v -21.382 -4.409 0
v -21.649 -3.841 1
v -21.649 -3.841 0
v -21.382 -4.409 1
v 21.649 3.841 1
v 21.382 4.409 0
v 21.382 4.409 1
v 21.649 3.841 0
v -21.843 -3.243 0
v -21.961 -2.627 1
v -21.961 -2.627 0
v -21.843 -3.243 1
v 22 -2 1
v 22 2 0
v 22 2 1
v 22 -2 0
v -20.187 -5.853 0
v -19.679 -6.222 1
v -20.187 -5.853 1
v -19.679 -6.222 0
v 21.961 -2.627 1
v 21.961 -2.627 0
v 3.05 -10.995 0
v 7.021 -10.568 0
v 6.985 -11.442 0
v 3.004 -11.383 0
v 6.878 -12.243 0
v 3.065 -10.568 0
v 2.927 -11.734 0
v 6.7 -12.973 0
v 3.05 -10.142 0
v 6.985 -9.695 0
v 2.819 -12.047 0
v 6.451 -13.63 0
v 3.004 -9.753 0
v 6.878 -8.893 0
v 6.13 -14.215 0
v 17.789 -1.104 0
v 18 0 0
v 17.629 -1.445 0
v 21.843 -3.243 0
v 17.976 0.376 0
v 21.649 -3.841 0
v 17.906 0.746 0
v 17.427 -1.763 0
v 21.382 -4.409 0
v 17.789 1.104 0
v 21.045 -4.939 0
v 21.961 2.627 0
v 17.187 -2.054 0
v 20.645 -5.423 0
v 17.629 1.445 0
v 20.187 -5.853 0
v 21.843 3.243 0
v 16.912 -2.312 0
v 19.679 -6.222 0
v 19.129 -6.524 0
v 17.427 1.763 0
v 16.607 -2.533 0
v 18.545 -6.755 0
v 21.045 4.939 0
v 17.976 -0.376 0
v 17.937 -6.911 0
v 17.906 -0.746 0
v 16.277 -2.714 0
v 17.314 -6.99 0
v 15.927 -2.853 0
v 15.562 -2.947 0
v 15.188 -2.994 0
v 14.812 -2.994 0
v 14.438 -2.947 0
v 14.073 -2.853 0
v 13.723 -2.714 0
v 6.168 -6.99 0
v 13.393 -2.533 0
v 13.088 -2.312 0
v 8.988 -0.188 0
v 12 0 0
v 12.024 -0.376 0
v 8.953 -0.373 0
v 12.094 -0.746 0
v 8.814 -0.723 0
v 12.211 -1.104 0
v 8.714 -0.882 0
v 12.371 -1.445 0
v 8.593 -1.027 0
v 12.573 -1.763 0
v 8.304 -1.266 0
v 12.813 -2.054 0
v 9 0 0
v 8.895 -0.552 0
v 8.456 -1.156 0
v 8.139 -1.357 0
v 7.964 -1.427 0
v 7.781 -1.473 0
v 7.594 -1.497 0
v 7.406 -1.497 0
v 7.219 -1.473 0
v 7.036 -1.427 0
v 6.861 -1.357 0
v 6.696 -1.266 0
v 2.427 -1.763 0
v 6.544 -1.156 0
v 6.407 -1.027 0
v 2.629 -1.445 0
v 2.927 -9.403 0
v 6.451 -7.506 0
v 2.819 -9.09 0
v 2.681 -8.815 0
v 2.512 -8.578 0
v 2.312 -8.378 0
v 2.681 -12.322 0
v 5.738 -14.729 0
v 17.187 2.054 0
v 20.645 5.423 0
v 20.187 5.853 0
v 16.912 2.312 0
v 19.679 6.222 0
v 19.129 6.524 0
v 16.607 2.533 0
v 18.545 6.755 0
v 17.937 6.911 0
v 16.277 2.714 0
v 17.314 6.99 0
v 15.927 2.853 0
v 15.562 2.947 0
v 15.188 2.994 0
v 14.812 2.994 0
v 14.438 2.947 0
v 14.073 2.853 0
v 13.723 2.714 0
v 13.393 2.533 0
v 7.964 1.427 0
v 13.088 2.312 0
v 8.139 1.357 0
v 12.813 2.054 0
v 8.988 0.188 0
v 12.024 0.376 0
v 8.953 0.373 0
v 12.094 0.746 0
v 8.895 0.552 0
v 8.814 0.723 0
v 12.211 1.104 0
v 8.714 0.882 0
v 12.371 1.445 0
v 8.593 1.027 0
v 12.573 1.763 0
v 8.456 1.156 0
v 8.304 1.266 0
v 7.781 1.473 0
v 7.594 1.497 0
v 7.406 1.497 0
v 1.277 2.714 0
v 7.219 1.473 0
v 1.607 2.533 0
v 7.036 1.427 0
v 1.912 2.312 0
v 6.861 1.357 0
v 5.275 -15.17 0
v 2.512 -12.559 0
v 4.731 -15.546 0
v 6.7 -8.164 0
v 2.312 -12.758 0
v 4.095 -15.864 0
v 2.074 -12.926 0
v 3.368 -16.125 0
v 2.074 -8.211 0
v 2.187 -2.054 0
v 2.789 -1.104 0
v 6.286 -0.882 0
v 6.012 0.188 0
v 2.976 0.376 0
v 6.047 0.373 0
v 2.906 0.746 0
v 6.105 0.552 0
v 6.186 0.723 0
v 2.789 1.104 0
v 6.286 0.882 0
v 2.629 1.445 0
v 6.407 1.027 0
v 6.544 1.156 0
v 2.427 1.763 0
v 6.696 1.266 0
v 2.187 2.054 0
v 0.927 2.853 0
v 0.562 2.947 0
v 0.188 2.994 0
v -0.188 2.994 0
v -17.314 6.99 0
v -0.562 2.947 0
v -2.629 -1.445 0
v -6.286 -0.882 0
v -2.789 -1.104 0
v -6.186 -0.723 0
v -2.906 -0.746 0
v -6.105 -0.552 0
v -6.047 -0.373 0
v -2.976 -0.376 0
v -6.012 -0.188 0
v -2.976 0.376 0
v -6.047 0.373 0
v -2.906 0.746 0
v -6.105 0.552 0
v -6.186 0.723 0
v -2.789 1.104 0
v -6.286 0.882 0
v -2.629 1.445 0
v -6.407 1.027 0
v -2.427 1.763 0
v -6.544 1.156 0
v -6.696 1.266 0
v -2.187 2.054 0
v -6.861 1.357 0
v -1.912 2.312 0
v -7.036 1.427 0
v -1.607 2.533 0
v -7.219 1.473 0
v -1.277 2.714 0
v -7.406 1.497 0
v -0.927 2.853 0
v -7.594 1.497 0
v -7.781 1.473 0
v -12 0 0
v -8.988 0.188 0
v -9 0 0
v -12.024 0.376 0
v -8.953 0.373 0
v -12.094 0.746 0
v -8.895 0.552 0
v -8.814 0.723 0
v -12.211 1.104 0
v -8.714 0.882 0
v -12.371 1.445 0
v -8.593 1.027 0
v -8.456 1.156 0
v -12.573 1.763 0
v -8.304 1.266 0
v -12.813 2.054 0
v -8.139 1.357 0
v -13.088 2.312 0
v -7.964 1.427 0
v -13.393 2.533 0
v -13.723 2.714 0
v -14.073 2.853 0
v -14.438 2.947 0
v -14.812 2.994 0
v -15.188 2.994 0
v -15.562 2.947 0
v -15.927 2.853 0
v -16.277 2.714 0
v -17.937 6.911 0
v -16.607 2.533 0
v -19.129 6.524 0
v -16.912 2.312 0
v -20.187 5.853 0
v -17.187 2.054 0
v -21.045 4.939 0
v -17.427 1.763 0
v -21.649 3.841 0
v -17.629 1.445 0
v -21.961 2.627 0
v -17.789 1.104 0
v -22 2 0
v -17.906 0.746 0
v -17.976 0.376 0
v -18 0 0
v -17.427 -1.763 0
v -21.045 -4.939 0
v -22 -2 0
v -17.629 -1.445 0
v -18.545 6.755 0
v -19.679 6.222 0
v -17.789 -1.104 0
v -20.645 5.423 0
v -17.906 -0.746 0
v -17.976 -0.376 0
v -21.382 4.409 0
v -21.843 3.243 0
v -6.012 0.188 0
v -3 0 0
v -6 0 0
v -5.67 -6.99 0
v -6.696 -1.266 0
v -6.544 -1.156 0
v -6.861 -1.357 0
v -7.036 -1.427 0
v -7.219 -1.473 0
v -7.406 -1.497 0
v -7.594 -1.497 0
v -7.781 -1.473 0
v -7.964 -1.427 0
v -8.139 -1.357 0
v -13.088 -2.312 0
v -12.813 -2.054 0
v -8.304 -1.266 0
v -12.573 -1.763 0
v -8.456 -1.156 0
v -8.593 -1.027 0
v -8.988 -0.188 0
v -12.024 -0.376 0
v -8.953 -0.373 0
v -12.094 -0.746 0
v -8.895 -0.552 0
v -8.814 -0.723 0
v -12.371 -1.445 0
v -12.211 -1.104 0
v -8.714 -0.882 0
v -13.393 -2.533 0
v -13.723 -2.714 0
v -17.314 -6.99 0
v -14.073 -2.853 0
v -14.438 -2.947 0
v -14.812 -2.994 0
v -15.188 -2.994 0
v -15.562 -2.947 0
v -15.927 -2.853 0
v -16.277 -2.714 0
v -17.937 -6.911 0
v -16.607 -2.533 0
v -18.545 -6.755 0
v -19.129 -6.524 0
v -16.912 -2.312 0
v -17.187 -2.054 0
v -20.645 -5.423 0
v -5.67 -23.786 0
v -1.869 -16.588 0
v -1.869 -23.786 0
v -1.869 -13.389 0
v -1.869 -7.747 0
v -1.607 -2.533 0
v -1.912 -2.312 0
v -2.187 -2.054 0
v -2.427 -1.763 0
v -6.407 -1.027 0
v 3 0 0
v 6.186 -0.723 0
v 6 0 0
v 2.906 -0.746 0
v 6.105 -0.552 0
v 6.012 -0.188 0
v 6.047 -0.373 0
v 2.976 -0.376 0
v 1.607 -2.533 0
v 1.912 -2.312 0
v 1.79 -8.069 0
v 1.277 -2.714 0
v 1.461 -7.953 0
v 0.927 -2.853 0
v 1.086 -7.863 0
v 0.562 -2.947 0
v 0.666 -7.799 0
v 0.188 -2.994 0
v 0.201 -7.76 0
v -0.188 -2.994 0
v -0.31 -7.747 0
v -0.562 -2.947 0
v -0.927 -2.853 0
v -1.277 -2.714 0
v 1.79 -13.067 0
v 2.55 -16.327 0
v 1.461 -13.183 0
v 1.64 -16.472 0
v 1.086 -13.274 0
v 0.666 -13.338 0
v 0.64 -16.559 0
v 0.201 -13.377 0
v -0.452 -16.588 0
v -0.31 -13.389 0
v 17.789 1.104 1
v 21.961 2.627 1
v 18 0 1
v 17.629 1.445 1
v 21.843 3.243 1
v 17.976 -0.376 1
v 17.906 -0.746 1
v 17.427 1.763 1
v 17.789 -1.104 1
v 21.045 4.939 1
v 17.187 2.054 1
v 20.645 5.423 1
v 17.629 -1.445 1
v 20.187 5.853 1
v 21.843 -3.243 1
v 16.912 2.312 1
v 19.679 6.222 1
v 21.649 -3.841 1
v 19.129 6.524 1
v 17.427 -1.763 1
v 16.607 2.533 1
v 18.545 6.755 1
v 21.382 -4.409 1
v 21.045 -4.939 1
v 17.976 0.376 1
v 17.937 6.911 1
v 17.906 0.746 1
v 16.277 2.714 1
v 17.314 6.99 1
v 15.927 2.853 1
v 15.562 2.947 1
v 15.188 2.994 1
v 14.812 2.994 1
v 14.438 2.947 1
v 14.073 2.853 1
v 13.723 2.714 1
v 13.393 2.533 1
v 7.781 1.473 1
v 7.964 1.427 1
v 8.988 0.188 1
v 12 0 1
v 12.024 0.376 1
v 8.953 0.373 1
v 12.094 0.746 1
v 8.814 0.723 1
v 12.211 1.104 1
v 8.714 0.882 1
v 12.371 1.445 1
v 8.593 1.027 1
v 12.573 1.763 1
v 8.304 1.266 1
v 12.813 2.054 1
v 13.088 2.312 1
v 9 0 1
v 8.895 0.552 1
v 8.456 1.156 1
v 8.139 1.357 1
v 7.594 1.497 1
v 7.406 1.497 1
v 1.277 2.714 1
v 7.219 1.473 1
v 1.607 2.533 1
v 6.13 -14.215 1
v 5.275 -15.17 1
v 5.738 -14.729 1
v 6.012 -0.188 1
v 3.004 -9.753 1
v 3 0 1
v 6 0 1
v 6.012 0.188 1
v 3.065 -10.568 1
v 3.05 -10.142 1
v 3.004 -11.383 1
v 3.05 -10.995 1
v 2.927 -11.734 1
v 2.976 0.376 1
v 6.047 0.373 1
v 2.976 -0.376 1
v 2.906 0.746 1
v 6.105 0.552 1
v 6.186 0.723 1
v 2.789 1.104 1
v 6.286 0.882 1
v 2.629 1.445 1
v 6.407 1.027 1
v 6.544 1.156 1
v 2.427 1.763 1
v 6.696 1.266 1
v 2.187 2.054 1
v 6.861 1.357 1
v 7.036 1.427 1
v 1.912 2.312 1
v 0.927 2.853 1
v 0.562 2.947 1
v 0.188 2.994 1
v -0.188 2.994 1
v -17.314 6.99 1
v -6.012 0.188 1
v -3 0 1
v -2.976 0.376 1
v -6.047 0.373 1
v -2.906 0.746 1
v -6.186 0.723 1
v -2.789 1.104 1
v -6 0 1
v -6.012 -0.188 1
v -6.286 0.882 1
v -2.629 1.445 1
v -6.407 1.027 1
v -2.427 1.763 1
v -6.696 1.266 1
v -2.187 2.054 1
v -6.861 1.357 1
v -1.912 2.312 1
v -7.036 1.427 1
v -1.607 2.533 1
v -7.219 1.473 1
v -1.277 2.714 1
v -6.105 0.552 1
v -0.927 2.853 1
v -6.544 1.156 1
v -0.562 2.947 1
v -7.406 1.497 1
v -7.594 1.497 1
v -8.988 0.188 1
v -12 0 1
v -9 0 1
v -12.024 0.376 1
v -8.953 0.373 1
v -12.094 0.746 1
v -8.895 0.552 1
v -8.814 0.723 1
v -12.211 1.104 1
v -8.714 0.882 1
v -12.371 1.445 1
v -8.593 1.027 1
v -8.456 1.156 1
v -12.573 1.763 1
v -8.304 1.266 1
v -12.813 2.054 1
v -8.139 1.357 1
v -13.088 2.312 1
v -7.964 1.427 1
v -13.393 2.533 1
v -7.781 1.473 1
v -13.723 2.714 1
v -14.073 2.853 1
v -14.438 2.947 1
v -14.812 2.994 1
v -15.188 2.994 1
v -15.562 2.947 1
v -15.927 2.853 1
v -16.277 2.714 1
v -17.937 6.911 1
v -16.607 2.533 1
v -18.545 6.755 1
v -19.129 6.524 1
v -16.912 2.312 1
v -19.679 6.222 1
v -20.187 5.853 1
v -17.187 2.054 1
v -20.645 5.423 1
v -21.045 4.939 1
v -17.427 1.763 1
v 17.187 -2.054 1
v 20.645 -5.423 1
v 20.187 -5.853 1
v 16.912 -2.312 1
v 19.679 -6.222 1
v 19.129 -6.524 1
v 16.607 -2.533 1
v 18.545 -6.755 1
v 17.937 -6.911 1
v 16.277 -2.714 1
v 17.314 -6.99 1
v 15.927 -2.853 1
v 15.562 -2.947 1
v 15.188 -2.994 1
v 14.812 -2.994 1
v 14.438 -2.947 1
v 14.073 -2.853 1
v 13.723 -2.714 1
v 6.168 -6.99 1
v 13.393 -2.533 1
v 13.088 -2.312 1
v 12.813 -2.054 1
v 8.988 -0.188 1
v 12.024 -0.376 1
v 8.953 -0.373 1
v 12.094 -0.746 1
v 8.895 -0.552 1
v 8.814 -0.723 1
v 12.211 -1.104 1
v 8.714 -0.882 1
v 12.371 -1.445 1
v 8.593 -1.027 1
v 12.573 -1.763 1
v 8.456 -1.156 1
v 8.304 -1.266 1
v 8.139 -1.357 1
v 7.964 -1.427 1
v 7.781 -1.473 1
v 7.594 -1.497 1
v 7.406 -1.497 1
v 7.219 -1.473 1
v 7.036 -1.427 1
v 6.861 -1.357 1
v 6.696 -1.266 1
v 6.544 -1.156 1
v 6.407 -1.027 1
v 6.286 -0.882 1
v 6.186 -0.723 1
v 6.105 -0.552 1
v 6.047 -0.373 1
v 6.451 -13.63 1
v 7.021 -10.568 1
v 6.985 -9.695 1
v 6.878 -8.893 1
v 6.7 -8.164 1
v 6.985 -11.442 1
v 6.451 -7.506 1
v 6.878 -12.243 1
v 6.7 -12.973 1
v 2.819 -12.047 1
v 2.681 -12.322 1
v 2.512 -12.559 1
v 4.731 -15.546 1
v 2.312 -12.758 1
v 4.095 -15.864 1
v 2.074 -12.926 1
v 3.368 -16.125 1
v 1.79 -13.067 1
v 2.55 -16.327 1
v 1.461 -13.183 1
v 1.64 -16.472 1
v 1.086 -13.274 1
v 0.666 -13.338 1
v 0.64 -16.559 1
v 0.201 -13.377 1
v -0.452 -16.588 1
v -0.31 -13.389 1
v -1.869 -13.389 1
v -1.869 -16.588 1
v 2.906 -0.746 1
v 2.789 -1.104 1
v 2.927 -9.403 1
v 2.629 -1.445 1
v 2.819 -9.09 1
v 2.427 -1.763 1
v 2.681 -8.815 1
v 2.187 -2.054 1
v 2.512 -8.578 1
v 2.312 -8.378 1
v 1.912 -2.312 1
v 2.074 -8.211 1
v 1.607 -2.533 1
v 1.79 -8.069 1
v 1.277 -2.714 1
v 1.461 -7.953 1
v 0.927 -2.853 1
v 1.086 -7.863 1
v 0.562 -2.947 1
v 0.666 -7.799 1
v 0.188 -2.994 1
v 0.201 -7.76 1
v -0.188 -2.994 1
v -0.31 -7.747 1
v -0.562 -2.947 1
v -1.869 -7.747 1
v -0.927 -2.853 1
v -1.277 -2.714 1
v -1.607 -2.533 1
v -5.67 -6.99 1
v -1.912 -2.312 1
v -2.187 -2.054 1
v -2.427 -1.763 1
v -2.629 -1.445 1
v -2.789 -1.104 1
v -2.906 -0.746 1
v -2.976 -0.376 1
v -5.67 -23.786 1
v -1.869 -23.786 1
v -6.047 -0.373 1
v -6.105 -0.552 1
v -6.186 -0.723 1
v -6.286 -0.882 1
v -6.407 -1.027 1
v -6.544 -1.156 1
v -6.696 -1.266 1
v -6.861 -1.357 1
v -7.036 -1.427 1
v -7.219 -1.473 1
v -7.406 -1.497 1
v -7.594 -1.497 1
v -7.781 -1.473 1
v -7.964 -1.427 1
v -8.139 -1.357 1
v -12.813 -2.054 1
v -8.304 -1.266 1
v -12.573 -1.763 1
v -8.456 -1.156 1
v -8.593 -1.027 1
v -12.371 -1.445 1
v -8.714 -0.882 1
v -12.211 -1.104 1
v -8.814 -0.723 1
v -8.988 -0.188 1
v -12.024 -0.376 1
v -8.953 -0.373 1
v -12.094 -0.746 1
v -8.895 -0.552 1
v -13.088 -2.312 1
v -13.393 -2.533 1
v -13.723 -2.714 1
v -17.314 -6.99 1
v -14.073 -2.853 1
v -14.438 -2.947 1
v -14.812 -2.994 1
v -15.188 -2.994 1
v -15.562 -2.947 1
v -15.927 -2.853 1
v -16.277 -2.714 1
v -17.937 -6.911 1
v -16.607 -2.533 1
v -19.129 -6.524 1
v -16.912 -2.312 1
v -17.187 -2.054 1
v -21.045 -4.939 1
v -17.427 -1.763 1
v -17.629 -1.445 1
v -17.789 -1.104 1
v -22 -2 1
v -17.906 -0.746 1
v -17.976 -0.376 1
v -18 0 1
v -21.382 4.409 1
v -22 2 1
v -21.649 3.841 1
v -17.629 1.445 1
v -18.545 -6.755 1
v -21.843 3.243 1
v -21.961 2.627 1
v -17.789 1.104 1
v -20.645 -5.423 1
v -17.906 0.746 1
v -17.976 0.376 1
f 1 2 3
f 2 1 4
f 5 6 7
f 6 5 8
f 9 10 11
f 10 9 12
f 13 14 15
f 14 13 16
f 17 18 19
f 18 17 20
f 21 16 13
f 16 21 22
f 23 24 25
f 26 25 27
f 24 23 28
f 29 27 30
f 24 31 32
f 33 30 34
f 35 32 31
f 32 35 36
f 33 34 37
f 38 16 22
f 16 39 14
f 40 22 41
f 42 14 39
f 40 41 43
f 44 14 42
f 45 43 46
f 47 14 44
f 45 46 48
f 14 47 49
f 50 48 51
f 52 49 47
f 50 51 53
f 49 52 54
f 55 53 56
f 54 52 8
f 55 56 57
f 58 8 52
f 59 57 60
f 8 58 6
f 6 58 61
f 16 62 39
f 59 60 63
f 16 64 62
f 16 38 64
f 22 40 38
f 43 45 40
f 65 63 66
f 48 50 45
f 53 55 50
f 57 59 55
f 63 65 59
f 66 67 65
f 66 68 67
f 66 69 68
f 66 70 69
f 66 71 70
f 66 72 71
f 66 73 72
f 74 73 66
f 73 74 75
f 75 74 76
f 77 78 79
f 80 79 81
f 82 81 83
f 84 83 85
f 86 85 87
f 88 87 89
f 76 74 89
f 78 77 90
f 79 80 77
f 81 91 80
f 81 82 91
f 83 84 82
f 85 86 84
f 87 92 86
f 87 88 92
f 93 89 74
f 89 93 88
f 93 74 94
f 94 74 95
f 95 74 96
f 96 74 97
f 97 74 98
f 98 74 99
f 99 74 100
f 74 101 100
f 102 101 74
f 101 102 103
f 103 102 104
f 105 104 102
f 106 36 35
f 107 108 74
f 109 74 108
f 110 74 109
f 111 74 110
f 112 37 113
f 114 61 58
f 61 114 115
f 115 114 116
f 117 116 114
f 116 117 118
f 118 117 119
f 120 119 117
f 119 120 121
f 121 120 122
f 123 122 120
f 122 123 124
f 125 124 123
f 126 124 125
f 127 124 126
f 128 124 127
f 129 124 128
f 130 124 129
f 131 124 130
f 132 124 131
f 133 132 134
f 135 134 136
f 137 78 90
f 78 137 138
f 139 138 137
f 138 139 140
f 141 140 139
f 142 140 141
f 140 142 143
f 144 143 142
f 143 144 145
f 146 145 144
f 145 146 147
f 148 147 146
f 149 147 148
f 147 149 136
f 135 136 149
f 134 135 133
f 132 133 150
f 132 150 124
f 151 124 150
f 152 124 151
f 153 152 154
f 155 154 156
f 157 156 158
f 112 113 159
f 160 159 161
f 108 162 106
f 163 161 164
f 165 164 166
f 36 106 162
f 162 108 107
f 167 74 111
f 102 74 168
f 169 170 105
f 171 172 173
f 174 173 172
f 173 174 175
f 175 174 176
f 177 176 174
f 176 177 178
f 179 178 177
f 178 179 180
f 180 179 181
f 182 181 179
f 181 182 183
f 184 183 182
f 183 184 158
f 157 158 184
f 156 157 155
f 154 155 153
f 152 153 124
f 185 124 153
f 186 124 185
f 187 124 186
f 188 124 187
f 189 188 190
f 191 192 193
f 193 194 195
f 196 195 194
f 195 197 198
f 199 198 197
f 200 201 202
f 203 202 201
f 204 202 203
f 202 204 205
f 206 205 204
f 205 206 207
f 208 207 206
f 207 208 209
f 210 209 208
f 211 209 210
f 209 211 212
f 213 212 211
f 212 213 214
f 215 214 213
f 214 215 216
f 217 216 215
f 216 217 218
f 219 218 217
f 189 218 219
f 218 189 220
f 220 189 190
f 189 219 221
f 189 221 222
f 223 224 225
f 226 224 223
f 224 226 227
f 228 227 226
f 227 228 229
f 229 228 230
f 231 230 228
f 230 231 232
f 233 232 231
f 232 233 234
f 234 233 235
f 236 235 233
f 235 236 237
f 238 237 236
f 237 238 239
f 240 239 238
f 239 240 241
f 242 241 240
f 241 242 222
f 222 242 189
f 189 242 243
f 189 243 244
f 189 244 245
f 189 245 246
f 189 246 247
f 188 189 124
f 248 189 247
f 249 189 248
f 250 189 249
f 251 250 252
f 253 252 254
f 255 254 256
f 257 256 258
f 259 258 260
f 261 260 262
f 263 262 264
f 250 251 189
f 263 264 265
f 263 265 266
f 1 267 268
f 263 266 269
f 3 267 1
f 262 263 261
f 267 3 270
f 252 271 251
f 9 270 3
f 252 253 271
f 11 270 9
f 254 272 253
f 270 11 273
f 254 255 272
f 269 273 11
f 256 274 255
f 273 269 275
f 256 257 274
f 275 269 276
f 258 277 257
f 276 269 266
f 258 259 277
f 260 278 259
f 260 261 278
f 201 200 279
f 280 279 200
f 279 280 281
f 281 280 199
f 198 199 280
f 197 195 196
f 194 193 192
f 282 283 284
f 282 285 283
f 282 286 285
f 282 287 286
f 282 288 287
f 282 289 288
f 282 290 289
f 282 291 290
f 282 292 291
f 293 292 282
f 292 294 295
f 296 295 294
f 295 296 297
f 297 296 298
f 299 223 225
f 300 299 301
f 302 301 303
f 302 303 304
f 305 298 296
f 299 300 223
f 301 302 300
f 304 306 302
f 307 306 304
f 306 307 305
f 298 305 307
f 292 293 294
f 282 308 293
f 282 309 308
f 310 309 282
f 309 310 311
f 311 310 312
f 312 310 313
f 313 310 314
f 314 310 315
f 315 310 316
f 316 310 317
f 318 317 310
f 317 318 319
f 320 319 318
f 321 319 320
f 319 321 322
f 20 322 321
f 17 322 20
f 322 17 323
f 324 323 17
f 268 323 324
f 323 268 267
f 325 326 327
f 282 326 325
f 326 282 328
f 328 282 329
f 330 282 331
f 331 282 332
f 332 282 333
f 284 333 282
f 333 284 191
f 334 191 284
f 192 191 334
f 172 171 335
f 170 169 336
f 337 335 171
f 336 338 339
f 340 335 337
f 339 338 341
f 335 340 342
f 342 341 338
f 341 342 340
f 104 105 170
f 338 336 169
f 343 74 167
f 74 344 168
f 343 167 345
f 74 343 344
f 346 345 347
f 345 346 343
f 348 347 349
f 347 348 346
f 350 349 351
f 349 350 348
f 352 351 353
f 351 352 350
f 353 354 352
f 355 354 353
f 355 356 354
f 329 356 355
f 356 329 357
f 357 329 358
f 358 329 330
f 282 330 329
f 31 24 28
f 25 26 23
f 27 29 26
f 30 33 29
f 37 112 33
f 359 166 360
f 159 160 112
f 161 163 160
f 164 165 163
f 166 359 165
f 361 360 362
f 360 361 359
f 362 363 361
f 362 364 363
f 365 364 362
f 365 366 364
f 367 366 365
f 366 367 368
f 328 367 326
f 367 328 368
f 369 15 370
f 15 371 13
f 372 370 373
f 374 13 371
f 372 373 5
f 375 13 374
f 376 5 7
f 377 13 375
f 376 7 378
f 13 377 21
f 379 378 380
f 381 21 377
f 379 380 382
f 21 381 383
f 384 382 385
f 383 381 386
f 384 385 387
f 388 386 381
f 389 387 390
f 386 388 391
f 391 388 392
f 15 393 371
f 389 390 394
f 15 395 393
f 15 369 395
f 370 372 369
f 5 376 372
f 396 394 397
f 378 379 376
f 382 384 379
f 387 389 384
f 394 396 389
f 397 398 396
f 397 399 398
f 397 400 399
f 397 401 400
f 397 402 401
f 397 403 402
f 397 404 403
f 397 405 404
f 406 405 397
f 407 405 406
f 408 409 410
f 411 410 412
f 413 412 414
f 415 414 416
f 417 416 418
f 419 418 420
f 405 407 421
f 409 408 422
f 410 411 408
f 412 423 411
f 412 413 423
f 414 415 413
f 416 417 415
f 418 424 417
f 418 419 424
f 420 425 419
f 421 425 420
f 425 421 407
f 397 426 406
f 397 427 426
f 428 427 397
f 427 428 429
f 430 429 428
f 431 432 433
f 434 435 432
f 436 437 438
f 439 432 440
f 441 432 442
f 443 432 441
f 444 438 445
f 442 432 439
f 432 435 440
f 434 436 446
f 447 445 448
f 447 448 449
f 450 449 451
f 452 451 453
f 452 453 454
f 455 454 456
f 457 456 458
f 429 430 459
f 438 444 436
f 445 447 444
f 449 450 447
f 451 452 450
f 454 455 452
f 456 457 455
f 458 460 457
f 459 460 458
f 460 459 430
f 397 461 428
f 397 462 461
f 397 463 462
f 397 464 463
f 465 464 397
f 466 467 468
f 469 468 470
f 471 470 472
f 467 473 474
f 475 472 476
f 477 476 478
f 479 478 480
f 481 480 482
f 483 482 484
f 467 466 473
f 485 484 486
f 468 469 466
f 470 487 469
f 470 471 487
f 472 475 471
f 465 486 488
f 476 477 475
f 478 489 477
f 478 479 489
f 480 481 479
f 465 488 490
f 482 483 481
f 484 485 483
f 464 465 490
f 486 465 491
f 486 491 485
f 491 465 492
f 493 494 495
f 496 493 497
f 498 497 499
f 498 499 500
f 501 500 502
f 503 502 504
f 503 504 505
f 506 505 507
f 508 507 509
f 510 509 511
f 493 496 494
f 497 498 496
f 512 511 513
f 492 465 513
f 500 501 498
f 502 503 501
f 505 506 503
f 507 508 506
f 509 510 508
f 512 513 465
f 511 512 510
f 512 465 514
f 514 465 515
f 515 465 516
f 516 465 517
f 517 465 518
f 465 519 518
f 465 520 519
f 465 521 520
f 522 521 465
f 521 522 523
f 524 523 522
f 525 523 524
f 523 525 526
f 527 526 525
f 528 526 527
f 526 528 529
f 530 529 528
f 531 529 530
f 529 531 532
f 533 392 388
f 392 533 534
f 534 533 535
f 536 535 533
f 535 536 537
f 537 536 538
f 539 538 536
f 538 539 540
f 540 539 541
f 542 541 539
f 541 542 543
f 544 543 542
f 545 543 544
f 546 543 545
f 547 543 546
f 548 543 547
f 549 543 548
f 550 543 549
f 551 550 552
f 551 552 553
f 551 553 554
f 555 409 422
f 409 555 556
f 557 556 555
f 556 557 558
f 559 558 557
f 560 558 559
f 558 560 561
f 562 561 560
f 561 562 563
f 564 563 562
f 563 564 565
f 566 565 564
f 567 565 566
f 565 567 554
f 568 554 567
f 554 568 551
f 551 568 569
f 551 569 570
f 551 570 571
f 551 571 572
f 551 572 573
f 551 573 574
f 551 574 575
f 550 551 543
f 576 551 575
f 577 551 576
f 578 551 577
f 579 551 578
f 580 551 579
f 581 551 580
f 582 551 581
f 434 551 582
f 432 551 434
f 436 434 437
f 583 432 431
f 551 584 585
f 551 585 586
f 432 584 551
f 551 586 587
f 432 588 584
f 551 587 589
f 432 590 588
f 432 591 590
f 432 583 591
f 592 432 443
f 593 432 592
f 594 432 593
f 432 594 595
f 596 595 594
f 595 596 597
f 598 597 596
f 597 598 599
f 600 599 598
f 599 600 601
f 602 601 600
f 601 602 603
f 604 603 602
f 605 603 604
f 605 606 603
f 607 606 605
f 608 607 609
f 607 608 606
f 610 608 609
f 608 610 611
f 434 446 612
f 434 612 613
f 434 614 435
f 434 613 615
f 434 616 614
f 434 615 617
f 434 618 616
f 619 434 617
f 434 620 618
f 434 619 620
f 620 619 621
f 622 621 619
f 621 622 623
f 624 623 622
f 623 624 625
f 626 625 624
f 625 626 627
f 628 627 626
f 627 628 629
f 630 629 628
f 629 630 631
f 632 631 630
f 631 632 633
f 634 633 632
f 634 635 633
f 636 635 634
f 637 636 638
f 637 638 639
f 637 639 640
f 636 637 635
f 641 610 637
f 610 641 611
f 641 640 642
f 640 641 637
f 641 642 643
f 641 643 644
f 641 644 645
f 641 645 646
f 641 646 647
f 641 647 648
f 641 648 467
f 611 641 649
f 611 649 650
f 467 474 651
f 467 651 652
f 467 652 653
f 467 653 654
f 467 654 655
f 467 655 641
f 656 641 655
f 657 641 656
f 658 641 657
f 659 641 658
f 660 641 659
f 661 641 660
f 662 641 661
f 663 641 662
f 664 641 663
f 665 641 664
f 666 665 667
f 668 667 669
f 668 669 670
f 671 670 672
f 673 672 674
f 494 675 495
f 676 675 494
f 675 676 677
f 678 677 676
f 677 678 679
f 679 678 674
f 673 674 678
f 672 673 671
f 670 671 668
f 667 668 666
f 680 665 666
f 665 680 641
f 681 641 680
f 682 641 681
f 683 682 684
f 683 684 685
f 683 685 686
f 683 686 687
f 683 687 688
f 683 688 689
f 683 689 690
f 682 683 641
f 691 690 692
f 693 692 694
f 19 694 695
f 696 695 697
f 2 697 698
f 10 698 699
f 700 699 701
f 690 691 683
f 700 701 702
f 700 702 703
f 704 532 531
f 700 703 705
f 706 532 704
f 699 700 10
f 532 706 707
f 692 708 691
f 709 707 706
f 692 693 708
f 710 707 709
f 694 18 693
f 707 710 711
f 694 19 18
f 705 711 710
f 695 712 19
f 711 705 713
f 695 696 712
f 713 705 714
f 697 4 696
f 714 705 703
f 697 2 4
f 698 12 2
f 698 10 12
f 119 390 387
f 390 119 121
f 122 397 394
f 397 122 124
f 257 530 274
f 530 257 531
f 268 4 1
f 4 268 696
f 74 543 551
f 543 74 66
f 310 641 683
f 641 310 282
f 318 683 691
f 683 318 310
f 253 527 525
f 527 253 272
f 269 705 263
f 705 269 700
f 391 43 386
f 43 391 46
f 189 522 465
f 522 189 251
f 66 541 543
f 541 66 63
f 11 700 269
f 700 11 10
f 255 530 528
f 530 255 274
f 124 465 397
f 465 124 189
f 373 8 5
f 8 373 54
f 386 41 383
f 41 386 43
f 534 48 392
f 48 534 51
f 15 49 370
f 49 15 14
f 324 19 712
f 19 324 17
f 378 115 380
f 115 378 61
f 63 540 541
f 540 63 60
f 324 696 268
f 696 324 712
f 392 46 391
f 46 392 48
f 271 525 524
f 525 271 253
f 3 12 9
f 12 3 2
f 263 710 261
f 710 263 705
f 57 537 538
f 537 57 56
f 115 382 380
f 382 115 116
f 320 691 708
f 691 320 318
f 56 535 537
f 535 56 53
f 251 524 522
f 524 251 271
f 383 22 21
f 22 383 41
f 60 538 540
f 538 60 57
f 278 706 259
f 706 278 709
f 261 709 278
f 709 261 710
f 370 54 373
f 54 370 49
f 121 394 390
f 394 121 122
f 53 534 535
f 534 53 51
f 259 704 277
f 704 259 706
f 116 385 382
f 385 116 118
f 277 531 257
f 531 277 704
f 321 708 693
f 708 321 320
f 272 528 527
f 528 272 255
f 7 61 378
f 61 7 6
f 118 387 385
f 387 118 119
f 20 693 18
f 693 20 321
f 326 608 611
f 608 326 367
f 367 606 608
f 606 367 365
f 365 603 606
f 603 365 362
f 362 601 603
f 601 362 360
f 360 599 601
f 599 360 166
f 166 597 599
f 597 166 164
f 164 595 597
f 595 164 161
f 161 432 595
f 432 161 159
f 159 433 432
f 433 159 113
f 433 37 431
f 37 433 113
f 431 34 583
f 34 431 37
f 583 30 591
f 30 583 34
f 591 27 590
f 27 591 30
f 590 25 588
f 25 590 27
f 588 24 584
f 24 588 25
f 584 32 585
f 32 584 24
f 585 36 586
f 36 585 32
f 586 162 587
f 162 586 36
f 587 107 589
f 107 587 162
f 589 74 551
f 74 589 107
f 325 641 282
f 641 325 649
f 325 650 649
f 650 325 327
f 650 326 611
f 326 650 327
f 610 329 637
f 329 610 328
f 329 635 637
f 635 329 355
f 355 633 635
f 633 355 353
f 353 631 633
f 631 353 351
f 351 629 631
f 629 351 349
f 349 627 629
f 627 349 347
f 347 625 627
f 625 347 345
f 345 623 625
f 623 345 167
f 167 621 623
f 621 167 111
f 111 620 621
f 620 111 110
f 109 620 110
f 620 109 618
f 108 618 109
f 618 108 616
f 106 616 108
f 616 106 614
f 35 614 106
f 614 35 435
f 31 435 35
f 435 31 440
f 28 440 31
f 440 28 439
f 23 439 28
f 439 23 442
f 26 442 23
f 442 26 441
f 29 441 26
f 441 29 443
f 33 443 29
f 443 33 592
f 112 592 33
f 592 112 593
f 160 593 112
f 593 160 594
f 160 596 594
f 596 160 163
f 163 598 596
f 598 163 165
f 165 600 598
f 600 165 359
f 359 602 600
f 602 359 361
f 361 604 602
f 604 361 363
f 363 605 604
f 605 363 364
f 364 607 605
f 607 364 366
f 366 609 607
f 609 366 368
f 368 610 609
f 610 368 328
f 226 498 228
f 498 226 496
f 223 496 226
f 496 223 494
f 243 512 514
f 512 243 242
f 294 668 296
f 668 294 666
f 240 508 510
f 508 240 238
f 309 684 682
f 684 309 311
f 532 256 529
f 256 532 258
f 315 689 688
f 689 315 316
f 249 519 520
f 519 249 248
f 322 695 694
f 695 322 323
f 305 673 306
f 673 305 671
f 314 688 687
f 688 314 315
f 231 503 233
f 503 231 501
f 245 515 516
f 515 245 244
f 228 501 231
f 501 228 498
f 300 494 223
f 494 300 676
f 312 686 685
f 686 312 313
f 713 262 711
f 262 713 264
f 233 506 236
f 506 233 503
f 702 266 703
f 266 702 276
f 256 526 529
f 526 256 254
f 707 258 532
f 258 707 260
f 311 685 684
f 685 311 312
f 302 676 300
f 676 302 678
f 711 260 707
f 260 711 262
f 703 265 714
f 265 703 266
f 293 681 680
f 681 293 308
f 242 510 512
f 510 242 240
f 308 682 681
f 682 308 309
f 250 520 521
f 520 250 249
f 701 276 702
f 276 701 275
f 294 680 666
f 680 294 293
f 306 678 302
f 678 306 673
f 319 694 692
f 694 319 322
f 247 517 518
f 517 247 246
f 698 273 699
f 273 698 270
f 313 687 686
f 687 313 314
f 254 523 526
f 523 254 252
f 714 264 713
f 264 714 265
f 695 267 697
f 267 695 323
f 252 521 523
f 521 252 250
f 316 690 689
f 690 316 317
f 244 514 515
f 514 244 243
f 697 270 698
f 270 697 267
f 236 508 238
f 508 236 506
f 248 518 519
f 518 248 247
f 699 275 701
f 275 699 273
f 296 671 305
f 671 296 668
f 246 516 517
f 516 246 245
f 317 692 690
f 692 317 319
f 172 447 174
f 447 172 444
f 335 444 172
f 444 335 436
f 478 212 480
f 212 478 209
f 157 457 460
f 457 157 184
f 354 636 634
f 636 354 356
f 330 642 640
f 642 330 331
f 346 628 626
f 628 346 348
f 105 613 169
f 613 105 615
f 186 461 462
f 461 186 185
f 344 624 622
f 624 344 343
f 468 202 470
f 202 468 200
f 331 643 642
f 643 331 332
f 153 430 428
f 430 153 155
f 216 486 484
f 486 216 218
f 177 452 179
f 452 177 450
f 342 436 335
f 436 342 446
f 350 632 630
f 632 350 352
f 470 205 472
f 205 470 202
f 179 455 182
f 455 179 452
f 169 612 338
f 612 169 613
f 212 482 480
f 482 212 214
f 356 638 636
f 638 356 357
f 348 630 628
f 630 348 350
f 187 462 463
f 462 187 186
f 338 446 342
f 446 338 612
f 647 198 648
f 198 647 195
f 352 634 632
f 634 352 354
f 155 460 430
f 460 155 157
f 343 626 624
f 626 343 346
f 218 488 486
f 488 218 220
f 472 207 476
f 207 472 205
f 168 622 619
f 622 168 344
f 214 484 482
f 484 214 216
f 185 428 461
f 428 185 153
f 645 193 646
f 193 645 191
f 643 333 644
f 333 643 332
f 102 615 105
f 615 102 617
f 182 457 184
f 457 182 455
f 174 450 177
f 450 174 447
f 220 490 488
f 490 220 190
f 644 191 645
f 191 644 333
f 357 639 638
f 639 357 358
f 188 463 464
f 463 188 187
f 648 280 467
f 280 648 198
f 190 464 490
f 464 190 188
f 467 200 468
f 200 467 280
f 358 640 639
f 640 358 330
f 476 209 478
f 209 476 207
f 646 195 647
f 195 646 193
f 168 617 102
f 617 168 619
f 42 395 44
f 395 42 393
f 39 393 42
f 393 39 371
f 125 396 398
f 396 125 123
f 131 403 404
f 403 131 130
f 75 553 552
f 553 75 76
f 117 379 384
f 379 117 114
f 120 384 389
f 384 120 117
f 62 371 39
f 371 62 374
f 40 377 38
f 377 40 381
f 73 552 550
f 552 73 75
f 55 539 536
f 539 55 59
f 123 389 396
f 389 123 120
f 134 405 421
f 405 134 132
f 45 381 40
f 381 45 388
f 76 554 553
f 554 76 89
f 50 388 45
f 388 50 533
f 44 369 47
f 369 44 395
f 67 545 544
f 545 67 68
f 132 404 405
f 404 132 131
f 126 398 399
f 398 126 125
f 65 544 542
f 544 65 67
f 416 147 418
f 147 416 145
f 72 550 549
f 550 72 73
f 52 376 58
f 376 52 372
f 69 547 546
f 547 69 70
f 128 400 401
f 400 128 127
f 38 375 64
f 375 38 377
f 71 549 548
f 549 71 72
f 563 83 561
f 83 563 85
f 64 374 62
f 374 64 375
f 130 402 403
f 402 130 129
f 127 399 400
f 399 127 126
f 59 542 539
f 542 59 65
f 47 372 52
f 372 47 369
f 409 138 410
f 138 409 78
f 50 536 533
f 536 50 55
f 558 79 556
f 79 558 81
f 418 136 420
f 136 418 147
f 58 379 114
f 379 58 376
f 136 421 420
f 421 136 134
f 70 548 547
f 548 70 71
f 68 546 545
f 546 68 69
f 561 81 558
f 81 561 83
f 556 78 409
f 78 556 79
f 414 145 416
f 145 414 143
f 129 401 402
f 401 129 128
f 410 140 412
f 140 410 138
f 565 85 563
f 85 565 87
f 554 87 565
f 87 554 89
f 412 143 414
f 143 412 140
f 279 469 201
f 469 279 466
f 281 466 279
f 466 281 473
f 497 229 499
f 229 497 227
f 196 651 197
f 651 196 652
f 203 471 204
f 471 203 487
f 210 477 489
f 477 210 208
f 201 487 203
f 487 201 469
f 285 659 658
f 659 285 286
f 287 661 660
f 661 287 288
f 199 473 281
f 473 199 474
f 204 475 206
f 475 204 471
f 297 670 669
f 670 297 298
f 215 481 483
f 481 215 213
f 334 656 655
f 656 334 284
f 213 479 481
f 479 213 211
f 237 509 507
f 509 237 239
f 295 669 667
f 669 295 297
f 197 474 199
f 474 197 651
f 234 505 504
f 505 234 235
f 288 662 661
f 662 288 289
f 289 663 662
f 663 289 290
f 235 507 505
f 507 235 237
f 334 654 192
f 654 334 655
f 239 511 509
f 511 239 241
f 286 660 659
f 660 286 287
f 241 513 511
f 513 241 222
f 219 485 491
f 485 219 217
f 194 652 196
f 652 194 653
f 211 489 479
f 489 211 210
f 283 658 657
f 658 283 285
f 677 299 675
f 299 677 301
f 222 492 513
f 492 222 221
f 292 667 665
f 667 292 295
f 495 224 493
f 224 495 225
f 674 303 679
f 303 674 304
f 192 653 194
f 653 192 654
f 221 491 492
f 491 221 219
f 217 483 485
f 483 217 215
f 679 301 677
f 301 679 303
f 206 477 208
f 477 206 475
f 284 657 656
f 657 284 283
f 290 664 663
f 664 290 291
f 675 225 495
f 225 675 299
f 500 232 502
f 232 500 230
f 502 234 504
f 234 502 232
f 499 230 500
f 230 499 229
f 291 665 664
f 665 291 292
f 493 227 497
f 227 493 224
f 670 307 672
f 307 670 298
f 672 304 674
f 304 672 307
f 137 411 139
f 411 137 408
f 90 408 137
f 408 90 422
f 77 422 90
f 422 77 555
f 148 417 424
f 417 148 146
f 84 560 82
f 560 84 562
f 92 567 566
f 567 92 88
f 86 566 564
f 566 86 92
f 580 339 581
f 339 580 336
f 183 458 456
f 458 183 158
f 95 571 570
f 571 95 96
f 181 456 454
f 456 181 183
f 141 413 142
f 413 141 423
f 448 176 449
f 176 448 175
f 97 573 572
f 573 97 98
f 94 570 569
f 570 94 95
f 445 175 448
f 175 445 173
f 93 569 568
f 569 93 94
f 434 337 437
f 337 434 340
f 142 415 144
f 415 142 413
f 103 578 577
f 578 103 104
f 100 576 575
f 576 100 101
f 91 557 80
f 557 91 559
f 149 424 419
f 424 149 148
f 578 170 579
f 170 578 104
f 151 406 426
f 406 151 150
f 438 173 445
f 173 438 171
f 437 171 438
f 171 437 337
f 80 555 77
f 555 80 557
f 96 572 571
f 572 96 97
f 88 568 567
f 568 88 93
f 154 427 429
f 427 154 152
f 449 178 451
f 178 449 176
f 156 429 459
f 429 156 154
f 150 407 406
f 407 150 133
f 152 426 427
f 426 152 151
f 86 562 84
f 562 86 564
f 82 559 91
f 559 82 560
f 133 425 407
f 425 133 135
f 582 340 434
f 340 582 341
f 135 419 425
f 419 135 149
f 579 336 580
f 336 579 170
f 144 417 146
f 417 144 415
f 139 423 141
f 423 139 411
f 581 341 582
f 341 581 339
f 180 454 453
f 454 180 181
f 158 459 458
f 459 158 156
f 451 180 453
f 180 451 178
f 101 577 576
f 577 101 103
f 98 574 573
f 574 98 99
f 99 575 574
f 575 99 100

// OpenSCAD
$fn = 50;


difference() {
	union() {
		hull() {
			translate(v = [-17.0000000000, 2.0000000000, 0]) {
				cylinder(h = 1, r = 5);
			}
			translate(v = [17.0000000000, 2.0000000000, 0]) {
				cylinder(h = 1, r = 5);
			}
			translate(v = [-17.0000000000, -2.0000000000, 0]) {
				cylinder(h = 1, r = 5);
			}
			translate(v = [17.0000000000, -2.0000000000, 0]) {
				cylinder(h = 1, r = 5);
			}
		}
		translate(v = [0, -5, 0]) {
			linear_extrude(height = 1) {
				text(font = "DejaVu Sans Mono:style=Bold", halign = "center", size = 19.0000000000, text = "P", valign = "top");
			}
		}
	}
	union() {
		translate(v = [-15.0000000000, 0.0000000000, 0]) {
			translate(v = [0, 0, -100]) {
				cylinder(h = 200, r = 3.0000000000);
			}
		}
		translate(v = [0, 0, -100]) {
			cylinder(h = 200, r = 3.0000000000);
		}
		translate(v = [15.0000000000, 0.0000000000, 0]) {
			translate(v = [0, 0, -100]) {
				cylinder(h = 200, r = 3.0000000000);
			}
		}
		translate(v = [-15.0000000000, 0.0000000000, 0]) {
			translate(v = [0, 0, -100]) {
				cylinder(h = 200, r = 1.5000000000);
			}
		}
		translate(v = [-7.5000000000, 0.0000000000, 0]) {
			translate(v = [0, 0, -100]) {
				cylinder(h = 200, r = 1.5000000000);
			}
		}
		translate(v = [0, 0, -100]) {
			cylinder(h = 200, r = 1.5000000000);
		}
		translate(v = [7.5000000000, 0.0000000000, 0]) {
			translate(v = [0, 0, -100]) {
				cylinder(h = 200, r = 1.5000000000);
			}
		}
		translate(v = [15.0000000000, 0.0000000000, 0]) {
			translate(v = [0, 0, -100]) {
				cylinder(h = 200, r = 1.5000000000);
			}
		}
	}
}
